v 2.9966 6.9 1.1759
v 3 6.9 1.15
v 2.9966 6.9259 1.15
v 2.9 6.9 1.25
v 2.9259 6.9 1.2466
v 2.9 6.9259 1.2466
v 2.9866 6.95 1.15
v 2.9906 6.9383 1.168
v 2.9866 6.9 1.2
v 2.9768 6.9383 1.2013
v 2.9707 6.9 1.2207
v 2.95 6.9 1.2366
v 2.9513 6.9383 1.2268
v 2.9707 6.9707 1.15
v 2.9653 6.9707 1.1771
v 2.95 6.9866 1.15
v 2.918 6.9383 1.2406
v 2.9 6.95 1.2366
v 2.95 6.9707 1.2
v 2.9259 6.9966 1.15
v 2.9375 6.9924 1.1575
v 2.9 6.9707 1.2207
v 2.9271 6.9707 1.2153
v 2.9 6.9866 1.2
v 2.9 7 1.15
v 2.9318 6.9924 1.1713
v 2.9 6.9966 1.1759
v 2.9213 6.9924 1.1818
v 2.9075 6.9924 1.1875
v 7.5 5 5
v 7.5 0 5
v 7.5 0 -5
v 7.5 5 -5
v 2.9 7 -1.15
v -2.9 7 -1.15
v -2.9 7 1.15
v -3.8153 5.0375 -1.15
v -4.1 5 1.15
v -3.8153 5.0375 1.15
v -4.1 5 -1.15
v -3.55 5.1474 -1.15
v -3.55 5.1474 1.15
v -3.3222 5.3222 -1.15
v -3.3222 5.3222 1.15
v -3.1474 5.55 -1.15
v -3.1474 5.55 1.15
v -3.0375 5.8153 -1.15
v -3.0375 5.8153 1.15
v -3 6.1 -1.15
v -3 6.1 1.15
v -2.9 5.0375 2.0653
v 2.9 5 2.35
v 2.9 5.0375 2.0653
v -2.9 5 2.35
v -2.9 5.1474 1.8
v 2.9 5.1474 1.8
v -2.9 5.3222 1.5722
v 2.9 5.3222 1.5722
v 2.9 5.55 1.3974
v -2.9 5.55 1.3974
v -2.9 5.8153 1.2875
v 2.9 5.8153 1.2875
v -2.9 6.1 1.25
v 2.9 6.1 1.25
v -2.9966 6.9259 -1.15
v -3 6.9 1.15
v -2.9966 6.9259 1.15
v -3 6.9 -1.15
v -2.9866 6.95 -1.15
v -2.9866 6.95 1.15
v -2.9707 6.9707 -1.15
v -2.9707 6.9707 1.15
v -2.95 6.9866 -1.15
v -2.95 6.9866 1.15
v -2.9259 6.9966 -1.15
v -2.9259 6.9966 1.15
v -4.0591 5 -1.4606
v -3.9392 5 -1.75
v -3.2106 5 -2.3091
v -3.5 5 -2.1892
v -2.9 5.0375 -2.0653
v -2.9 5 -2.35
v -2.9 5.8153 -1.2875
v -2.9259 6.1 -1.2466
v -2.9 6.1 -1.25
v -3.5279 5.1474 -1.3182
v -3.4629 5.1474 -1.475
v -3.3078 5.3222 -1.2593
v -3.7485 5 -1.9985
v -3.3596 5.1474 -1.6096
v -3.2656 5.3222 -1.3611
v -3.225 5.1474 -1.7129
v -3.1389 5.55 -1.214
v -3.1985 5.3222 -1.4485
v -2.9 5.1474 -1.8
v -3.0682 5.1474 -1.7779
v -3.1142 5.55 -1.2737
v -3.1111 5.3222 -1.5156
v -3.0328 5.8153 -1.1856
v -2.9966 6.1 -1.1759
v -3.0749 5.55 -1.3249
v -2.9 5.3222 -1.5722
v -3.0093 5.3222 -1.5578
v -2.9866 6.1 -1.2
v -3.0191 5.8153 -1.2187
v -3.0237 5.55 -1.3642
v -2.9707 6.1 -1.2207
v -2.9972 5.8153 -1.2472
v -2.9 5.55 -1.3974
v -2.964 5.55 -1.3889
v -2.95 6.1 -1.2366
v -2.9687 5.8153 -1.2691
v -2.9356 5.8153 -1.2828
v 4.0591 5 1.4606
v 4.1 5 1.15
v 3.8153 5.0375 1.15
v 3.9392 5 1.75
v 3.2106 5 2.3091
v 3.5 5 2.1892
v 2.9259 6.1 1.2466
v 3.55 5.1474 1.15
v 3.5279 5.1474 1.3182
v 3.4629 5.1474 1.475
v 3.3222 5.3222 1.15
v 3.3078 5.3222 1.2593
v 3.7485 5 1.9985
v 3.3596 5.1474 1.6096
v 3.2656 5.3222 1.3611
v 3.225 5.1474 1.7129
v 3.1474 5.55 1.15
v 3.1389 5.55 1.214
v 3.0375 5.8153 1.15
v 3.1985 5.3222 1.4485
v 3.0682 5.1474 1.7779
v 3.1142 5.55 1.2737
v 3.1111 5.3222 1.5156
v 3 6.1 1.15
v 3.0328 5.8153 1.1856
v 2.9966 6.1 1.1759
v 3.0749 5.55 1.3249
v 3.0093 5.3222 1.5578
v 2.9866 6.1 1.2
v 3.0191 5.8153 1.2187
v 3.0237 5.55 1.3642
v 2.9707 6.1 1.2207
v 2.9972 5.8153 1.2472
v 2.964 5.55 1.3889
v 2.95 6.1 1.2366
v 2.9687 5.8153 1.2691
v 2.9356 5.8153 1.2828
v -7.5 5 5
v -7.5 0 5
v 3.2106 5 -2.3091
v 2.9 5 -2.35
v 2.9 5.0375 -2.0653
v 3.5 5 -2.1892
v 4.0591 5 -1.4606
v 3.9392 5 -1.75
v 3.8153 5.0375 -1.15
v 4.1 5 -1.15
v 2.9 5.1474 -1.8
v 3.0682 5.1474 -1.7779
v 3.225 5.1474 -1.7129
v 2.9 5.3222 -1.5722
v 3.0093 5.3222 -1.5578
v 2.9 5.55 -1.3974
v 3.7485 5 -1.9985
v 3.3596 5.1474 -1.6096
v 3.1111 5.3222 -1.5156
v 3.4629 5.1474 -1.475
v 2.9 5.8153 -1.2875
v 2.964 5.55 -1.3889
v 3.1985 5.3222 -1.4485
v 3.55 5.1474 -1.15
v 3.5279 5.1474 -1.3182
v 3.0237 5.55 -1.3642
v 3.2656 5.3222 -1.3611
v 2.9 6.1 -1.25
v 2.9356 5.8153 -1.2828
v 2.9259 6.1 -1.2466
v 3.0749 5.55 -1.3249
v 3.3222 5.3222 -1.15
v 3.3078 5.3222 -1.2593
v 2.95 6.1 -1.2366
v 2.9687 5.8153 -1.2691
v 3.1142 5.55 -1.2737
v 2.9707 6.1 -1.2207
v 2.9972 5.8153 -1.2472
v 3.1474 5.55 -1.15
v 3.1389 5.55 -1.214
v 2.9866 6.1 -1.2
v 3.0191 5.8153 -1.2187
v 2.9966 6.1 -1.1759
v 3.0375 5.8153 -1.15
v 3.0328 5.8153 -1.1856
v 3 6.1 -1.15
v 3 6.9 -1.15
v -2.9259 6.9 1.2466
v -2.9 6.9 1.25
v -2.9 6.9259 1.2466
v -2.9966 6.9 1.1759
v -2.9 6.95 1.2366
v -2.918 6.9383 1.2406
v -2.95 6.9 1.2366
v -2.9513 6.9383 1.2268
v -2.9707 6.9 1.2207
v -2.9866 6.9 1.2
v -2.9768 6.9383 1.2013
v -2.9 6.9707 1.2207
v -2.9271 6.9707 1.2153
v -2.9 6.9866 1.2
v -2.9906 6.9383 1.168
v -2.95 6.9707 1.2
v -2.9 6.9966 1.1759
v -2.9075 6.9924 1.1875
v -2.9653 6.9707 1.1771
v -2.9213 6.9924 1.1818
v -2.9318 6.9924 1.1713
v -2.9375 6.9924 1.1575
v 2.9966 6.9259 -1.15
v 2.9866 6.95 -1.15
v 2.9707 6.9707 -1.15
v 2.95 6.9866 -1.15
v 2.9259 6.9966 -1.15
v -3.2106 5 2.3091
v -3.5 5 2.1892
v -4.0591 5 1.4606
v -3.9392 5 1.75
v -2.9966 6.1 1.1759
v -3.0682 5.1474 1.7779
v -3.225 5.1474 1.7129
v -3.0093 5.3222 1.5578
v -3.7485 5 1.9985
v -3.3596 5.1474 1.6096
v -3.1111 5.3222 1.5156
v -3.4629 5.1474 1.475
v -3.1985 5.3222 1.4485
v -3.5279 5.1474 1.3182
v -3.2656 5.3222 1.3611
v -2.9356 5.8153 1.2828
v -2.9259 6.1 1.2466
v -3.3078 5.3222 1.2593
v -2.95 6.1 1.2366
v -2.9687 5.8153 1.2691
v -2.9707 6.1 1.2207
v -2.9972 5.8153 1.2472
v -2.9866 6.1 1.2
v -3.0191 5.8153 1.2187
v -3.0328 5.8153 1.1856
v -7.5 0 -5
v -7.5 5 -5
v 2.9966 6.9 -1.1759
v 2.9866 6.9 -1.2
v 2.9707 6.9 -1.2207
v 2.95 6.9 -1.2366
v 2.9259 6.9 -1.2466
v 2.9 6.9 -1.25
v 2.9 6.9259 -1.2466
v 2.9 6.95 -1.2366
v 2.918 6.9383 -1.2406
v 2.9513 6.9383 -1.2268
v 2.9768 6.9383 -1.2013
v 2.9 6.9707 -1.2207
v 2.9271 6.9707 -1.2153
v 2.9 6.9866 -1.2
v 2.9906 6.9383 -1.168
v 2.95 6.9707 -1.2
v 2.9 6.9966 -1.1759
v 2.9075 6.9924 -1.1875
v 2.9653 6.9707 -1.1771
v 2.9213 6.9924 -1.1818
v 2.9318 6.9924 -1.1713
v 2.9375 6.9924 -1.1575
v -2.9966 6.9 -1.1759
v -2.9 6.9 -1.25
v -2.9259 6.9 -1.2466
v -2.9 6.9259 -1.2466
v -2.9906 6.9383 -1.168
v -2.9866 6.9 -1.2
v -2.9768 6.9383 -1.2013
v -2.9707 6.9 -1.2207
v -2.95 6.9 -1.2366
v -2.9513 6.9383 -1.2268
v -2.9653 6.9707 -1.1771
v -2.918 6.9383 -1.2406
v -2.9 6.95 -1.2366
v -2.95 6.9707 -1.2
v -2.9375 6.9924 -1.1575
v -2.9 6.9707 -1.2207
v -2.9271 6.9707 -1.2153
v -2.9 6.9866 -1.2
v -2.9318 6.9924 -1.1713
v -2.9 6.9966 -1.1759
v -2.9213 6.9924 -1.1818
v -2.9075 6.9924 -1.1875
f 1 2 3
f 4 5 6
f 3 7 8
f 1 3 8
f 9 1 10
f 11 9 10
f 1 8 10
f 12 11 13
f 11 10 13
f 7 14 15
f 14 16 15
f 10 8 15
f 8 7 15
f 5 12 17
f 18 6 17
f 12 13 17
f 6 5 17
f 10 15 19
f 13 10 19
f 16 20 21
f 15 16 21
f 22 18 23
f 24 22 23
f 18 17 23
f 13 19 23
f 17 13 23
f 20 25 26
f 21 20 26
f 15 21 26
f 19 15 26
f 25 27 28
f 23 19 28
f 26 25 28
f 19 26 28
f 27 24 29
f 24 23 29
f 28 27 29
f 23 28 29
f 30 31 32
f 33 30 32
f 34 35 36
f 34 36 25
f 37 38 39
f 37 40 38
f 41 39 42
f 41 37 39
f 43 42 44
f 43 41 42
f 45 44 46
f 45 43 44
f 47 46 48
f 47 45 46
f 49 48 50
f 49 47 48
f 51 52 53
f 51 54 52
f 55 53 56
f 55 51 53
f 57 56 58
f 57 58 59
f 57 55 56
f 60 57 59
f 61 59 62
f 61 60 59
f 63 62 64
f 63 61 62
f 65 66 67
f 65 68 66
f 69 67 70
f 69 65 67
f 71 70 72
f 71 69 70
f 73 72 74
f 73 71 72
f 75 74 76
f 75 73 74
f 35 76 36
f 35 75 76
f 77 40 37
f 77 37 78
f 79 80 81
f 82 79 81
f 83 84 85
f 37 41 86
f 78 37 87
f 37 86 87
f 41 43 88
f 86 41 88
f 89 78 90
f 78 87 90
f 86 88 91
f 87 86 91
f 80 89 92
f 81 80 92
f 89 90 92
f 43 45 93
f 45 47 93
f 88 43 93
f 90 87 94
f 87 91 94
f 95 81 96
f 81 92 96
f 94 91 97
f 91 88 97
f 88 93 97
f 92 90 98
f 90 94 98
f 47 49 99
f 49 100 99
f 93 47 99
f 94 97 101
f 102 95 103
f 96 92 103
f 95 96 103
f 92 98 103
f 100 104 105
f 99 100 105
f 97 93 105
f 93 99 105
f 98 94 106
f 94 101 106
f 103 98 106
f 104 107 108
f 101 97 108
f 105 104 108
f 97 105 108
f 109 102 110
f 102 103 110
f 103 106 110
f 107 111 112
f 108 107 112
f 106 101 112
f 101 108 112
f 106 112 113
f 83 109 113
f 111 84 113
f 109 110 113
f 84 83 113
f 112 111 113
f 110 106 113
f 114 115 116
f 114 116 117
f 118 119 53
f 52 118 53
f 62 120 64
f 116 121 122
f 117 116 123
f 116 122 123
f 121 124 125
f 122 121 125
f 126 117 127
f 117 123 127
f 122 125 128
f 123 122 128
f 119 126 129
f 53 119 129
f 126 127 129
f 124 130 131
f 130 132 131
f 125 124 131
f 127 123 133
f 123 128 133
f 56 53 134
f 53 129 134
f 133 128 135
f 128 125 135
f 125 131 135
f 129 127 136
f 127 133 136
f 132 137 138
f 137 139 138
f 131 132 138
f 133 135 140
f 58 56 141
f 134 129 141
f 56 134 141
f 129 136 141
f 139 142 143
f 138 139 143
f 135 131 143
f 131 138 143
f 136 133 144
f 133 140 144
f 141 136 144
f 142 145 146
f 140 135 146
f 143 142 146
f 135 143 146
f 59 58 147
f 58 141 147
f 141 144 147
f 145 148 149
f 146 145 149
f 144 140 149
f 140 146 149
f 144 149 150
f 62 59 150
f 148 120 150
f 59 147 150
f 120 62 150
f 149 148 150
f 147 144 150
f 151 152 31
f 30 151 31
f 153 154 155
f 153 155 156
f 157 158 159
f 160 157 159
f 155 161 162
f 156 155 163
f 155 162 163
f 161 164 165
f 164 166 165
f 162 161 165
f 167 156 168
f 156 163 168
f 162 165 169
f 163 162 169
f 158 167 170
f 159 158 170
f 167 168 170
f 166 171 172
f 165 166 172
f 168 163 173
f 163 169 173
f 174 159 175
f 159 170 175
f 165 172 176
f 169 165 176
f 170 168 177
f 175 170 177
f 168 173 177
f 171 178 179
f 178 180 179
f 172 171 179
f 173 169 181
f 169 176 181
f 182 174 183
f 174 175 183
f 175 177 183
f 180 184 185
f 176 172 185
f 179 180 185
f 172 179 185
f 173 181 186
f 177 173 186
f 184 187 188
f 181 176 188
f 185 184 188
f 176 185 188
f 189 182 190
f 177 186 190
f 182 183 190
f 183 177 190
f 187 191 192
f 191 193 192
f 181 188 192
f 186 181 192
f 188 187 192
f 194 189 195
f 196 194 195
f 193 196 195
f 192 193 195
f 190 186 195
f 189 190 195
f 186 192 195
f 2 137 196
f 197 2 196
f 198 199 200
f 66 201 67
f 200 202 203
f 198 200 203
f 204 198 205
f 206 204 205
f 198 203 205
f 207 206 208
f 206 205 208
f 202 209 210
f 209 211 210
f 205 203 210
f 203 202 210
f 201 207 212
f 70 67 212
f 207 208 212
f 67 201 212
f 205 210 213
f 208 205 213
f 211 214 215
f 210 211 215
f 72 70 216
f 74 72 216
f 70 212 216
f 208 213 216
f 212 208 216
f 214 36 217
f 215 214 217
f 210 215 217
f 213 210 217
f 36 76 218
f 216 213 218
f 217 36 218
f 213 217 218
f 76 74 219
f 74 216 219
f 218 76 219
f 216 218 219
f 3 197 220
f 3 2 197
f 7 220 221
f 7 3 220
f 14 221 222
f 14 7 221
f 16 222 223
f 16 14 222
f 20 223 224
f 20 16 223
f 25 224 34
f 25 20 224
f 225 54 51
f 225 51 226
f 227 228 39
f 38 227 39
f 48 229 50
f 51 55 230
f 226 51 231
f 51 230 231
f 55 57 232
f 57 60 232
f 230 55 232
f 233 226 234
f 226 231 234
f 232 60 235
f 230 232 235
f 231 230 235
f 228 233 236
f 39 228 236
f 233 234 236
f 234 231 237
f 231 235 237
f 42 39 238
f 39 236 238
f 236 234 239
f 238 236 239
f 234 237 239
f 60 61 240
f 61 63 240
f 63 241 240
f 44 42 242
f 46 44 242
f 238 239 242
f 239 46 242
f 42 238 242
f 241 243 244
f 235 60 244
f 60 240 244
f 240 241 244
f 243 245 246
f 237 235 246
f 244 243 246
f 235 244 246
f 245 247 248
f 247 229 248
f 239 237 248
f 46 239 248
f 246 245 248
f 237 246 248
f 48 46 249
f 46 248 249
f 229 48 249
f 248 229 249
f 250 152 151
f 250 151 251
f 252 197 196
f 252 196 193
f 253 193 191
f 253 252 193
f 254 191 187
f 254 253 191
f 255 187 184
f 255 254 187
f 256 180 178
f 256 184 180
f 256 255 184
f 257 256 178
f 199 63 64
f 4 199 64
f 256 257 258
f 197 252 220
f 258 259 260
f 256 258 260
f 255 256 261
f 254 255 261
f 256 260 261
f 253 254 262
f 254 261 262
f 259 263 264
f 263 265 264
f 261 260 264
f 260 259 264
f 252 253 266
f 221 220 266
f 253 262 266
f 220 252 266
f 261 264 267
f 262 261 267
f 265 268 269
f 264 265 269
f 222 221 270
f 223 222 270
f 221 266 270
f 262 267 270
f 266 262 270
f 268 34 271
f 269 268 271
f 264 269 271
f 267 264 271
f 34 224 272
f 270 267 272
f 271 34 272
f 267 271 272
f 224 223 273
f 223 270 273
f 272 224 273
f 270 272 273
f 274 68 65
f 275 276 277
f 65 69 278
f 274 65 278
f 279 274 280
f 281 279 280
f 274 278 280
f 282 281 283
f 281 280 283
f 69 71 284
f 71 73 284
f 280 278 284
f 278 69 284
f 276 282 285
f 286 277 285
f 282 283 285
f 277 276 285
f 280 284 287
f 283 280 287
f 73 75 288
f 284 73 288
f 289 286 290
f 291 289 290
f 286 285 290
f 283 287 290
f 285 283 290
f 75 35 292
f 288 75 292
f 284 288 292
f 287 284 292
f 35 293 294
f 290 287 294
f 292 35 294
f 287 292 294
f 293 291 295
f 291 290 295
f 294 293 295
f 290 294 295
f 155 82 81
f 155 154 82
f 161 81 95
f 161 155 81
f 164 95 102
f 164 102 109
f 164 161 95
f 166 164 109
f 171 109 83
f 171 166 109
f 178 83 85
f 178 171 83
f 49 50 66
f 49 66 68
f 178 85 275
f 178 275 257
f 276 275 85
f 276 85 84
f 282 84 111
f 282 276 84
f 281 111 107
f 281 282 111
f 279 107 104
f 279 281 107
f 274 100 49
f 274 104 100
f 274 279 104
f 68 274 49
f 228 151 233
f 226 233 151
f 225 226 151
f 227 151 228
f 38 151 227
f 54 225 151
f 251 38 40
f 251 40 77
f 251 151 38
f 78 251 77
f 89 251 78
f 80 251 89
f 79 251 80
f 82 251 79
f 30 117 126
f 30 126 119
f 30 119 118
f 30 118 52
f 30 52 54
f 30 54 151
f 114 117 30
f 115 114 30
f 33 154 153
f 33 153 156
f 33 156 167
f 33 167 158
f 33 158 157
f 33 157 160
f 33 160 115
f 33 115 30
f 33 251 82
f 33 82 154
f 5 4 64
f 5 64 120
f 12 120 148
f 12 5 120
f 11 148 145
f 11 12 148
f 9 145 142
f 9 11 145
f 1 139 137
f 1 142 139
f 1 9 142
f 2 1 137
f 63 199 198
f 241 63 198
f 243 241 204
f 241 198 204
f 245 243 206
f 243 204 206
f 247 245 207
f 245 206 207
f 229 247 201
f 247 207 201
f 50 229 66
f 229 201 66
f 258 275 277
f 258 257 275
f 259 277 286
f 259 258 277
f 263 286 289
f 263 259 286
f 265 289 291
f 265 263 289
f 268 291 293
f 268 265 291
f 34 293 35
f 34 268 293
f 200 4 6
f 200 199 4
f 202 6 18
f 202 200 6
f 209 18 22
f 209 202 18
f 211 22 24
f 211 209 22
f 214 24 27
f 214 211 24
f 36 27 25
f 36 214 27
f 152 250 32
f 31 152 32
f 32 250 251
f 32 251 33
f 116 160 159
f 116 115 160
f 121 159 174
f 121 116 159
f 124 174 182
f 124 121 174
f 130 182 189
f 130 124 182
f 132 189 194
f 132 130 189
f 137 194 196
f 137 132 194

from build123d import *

# Parameters (mm, degrees)
SKETCH_1_W      = 15
SKETCH_1_H      = 10
EXTRUDE_1_DEPTH = 5
SKETCH_2_W      = 6
SKETCH_2_H      = 2.5
EXTRUDE_2_DEPTH = 2
FILLET_1_R      = 0.1
FILLET_2_R      = 1.1
FILLET_3_R      = 0.1


with BuildPart() as part:
    # 草图1 → 凸台-拉伸1 (new body)
    with BuildSketch(Plane(origin=(0, 0, 0), x_dir=(1, 0, 0), z_dir=(0, 1, 0))):
        Rectangle(SKETCH_1_W, SKETCH_1_H)
    extrude(amount=EXTRUDE_1_DEPTH)

    # 草图2 → 凸台-拉伸2 (add)
    with BuildSketch(Plane(origin=(0, 5, 0), x_dir=(1, 0, 0), z_dir=(0, 1, 0))):
        Rectangle(SKETCH_2_W, SKETCH_2_H)
    extrude(amount=EXTRUDE_2_DEPTH)

    # 圆角1
    fillet_1_edges = [part.edges().sort_by_distance(p)[0] for p in [
        (-3, 6, -1.25),
        (-3, 6, 1.25),
        (3, 6, 1.25),
        (3, 6, -1.25),
    ]]
    fillet(fillet_1_edges, radius=FILLET_1_R)

    # 圆角2
    fillet_2_edges = [part.edges().sort_by_distance(p)[0] for p in [
        (-3, 5, 0),
        (0, 5, -1.25),
        (3, 5, 0),
        (0, 5, 1.25),
        (-2.970710678, 5, -1.220710678),
        (2.970710678, 5, -1.220710678),
        (2.970710678, 5, 1.220710678),
        (-2.970710678, 5, 1.220710678),
    ]]
    fillet(fillet_2_edges, radius=FILLET_2_R)

    # 圆角3
    fillet_3_edges = [part.edges().sort_by_distance(p)[0] for p in [
        (-3, 7, 0),
        (0, 7, -1.25),
        (0, 7, 1.25),
        (3, 7, 0),
        (-2.970710678, 7, 1.220710678),
        (2.970710678, 7, 1.220710678),
        (2.970710678, 7, -1.220710678),
        (-2.970710678, 7, -1.220710678),
    ]]
    fillet(fillet_3_edges, radius=FILLET_3_R)


solid = part.part
